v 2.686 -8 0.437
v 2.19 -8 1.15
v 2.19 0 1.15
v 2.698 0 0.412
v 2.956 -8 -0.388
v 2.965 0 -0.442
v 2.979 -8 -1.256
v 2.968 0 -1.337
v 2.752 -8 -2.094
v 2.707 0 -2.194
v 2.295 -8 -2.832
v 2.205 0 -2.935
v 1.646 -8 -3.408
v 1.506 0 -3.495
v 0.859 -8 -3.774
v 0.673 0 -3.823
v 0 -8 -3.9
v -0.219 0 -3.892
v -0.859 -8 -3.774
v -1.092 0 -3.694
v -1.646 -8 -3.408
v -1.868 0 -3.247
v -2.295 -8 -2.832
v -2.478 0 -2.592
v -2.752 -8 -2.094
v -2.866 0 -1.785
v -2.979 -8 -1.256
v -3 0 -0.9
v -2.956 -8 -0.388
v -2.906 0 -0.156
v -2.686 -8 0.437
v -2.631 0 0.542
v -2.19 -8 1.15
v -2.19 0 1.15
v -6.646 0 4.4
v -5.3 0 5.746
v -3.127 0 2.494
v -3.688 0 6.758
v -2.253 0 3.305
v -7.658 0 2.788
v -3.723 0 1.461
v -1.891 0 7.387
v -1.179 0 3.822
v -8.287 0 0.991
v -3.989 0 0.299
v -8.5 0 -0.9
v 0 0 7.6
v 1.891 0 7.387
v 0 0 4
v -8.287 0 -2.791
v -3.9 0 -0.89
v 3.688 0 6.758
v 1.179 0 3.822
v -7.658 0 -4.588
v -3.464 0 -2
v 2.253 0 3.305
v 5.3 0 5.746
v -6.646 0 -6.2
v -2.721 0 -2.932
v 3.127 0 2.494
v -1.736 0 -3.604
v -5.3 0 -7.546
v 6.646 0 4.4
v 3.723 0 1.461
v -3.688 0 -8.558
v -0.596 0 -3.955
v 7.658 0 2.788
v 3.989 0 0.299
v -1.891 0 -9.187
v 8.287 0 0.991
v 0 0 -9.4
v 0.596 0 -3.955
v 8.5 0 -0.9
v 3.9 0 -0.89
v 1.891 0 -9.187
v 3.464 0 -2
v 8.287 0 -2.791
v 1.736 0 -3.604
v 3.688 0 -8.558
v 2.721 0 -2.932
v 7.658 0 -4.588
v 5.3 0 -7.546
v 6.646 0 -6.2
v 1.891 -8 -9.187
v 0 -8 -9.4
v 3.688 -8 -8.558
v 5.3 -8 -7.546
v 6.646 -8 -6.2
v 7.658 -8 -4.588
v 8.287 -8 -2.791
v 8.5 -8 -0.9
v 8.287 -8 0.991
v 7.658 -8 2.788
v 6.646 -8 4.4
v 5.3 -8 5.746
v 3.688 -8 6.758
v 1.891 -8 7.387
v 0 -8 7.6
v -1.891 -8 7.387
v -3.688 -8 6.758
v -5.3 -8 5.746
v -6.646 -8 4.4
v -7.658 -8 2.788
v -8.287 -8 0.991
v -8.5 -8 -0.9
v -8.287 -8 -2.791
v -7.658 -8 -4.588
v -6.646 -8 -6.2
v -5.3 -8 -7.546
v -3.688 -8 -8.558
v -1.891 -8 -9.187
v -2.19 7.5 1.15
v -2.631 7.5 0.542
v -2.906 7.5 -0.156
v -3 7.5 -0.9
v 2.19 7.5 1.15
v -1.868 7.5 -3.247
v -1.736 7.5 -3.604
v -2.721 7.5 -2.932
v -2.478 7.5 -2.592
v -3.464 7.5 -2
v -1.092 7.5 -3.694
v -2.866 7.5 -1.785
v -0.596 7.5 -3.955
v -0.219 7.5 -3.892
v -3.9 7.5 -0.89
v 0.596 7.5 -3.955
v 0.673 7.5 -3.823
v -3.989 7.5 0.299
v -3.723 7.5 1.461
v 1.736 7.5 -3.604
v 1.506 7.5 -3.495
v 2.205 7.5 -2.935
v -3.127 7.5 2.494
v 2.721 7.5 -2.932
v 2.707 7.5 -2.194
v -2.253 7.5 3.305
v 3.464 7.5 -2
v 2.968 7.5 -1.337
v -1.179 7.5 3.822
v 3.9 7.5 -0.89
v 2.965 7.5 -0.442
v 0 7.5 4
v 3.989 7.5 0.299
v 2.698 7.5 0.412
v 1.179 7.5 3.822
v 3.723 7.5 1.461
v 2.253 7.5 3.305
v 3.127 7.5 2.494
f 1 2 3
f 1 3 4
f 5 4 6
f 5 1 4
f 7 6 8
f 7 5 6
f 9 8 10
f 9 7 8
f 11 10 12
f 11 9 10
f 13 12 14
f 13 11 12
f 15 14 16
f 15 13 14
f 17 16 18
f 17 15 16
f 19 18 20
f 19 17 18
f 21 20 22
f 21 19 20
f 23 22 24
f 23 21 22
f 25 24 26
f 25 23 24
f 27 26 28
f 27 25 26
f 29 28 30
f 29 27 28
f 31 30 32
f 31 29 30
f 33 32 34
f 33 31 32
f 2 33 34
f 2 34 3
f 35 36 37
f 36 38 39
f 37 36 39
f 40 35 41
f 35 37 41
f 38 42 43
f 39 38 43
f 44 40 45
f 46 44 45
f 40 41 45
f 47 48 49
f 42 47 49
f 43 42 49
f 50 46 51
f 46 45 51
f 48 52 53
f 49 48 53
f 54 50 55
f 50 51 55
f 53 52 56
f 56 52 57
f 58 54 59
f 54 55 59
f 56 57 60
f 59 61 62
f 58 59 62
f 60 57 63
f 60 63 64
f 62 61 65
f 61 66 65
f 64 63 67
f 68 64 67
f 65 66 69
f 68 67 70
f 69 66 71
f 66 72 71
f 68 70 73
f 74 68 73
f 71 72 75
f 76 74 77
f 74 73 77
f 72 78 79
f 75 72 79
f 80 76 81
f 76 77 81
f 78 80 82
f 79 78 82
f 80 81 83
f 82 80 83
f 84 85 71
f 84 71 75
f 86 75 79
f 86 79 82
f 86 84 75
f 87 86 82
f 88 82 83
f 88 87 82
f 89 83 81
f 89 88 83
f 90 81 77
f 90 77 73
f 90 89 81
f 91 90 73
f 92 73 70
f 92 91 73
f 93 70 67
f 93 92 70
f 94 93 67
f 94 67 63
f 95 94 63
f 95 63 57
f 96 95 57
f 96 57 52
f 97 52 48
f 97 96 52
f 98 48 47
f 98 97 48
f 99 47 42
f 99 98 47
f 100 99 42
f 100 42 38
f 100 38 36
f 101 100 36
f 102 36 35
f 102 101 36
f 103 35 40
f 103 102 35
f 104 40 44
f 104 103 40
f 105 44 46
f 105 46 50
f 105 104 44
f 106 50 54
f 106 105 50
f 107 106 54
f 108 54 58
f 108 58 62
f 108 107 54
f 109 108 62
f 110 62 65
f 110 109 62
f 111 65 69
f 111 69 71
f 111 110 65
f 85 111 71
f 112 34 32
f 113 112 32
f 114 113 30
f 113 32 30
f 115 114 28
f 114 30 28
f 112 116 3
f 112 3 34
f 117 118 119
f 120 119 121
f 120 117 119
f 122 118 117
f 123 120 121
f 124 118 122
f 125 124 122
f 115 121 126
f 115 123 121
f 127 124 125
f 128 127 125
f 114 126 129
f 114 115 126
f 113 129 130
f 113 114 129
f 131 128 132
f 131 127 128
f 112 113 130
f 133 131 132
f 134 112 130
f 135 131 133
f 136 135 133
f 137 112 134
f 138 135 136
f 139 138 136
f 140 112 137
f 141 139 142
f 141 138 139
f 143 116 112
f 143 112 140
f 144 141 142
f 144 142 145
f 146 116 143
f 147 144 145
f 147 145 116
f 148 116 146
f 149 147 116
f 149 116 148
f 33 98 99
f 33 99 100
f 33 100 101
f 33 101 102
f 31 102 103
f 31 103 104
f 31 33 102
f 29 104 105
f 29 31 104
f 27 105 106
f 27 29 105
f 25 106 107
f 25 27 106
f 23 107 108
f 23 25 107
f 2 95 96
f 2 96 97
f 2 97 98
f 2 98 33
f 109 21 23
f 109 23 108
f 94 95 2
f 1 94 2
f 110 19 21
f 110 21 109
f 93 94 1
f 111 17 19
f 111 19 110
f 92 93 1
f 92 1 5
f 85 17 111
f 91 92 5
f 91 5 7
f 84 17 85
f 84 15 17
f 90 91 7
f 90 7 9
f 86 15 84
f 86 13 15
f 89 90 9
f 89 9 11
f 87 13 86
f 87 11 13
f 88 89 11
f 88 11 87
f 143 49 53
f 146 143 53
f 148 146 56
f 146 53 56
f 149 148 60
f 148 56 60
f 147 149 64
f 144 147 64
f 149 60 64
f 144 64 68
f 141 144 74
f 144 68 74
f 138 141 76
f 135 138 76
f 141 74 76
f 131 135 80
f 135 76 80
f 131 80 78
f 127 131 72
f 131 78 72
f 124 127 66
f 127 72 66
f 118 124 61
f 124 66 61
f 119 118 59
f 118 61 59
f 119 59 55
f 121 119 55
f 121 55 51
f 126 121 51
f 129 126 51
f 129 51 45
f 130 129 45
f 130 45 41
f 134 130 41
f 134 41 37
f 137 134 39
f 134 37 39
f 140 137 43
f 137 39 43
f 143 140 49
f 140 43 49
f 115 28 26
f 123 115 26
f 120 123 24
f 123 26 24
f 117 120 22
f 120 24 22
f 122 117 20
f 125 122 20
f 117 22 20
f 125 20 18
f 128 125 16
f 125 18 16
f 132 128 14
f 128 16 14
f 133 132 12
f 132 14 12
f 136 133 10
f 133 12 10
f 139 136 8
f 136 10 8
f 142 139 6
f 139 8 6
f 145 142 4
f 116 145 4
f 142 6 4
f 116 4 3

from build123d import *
from build123d.topology import SkipClean

# Parameters (mm, degrees)
SKETCH1_R           = 4
BOSS_EXTRUDE1_DEPTH = 7.5
CUT_EXTRUDE2_DEPTH  = 10
BOSS_EXTRUDE3_START = 8
SKETCH4_R           = 8.5
BOSS_EXTRUDE3_DEPTH = 8


with BuildPart() as part:
    # Sketch1 → Boss-Extrude1 (new body)
    with BuildSketch(Plane(origin=(0, 0, 0), x_dir=(1, 0, 0), z_dir=(0, 1, 0))):
        with Locations(Location((0, 0, 0), (0, 0, 270))):
            Circle(SKETCH1_R)
    extrude(amount=BOSS_EXTRUDE1_DEPTH)

    # Sketch2 → Cut-Extrude2 (cut)
    with BuildSketch(Plane(origin=(0, 0, 0), x_dir=(-1, 0, 0), z_dir=(0, -1, 0))):
        with BuildLine():
            Line((-2.190319611, -1.15), (2.190319611, -1.15))
            ThreePointArc((2.190319611, -1.15), (2.790247196, -0.202052895), (3, 0.9))
            ThreePointArc((3, 0.9), (-1.102052895, 3.690247196), (-2.190319611, -1.15))
        make_face()
    extrude(amount=-CUT_EXTRUDE2_DEPTH, mode=Mode.SUBTRACT)

    # Sketch4 → Boss-Extrude3 (add)
    with SkipClean():  # the faces are left unmerged after this step: merging them gives an invalid solid
        with BuildSketch(Plane(origin=(0, 0, 0), x_dir=(-1, 0, 0), z_dir=(0, -1, 0)).offset(BOSS_EXTRUDE3_START)):
            with Locations(Location((0, 0.9, 0), (0, 0, 90))):
                Circle(SKETCH4_R)
            with BuildLine():
                Line((2.190319611, -1.15), (-2.190319611, -1.15))
                ThreePointArc((-2.190319611, -1.15), (0, 3.9), (2.190319611, -1.15))
            make_face(mode=Mode.SUBTRACT)
        extrude(amount=-BOSS_EXTRUDE3_DEPTH)


solid = part.part
